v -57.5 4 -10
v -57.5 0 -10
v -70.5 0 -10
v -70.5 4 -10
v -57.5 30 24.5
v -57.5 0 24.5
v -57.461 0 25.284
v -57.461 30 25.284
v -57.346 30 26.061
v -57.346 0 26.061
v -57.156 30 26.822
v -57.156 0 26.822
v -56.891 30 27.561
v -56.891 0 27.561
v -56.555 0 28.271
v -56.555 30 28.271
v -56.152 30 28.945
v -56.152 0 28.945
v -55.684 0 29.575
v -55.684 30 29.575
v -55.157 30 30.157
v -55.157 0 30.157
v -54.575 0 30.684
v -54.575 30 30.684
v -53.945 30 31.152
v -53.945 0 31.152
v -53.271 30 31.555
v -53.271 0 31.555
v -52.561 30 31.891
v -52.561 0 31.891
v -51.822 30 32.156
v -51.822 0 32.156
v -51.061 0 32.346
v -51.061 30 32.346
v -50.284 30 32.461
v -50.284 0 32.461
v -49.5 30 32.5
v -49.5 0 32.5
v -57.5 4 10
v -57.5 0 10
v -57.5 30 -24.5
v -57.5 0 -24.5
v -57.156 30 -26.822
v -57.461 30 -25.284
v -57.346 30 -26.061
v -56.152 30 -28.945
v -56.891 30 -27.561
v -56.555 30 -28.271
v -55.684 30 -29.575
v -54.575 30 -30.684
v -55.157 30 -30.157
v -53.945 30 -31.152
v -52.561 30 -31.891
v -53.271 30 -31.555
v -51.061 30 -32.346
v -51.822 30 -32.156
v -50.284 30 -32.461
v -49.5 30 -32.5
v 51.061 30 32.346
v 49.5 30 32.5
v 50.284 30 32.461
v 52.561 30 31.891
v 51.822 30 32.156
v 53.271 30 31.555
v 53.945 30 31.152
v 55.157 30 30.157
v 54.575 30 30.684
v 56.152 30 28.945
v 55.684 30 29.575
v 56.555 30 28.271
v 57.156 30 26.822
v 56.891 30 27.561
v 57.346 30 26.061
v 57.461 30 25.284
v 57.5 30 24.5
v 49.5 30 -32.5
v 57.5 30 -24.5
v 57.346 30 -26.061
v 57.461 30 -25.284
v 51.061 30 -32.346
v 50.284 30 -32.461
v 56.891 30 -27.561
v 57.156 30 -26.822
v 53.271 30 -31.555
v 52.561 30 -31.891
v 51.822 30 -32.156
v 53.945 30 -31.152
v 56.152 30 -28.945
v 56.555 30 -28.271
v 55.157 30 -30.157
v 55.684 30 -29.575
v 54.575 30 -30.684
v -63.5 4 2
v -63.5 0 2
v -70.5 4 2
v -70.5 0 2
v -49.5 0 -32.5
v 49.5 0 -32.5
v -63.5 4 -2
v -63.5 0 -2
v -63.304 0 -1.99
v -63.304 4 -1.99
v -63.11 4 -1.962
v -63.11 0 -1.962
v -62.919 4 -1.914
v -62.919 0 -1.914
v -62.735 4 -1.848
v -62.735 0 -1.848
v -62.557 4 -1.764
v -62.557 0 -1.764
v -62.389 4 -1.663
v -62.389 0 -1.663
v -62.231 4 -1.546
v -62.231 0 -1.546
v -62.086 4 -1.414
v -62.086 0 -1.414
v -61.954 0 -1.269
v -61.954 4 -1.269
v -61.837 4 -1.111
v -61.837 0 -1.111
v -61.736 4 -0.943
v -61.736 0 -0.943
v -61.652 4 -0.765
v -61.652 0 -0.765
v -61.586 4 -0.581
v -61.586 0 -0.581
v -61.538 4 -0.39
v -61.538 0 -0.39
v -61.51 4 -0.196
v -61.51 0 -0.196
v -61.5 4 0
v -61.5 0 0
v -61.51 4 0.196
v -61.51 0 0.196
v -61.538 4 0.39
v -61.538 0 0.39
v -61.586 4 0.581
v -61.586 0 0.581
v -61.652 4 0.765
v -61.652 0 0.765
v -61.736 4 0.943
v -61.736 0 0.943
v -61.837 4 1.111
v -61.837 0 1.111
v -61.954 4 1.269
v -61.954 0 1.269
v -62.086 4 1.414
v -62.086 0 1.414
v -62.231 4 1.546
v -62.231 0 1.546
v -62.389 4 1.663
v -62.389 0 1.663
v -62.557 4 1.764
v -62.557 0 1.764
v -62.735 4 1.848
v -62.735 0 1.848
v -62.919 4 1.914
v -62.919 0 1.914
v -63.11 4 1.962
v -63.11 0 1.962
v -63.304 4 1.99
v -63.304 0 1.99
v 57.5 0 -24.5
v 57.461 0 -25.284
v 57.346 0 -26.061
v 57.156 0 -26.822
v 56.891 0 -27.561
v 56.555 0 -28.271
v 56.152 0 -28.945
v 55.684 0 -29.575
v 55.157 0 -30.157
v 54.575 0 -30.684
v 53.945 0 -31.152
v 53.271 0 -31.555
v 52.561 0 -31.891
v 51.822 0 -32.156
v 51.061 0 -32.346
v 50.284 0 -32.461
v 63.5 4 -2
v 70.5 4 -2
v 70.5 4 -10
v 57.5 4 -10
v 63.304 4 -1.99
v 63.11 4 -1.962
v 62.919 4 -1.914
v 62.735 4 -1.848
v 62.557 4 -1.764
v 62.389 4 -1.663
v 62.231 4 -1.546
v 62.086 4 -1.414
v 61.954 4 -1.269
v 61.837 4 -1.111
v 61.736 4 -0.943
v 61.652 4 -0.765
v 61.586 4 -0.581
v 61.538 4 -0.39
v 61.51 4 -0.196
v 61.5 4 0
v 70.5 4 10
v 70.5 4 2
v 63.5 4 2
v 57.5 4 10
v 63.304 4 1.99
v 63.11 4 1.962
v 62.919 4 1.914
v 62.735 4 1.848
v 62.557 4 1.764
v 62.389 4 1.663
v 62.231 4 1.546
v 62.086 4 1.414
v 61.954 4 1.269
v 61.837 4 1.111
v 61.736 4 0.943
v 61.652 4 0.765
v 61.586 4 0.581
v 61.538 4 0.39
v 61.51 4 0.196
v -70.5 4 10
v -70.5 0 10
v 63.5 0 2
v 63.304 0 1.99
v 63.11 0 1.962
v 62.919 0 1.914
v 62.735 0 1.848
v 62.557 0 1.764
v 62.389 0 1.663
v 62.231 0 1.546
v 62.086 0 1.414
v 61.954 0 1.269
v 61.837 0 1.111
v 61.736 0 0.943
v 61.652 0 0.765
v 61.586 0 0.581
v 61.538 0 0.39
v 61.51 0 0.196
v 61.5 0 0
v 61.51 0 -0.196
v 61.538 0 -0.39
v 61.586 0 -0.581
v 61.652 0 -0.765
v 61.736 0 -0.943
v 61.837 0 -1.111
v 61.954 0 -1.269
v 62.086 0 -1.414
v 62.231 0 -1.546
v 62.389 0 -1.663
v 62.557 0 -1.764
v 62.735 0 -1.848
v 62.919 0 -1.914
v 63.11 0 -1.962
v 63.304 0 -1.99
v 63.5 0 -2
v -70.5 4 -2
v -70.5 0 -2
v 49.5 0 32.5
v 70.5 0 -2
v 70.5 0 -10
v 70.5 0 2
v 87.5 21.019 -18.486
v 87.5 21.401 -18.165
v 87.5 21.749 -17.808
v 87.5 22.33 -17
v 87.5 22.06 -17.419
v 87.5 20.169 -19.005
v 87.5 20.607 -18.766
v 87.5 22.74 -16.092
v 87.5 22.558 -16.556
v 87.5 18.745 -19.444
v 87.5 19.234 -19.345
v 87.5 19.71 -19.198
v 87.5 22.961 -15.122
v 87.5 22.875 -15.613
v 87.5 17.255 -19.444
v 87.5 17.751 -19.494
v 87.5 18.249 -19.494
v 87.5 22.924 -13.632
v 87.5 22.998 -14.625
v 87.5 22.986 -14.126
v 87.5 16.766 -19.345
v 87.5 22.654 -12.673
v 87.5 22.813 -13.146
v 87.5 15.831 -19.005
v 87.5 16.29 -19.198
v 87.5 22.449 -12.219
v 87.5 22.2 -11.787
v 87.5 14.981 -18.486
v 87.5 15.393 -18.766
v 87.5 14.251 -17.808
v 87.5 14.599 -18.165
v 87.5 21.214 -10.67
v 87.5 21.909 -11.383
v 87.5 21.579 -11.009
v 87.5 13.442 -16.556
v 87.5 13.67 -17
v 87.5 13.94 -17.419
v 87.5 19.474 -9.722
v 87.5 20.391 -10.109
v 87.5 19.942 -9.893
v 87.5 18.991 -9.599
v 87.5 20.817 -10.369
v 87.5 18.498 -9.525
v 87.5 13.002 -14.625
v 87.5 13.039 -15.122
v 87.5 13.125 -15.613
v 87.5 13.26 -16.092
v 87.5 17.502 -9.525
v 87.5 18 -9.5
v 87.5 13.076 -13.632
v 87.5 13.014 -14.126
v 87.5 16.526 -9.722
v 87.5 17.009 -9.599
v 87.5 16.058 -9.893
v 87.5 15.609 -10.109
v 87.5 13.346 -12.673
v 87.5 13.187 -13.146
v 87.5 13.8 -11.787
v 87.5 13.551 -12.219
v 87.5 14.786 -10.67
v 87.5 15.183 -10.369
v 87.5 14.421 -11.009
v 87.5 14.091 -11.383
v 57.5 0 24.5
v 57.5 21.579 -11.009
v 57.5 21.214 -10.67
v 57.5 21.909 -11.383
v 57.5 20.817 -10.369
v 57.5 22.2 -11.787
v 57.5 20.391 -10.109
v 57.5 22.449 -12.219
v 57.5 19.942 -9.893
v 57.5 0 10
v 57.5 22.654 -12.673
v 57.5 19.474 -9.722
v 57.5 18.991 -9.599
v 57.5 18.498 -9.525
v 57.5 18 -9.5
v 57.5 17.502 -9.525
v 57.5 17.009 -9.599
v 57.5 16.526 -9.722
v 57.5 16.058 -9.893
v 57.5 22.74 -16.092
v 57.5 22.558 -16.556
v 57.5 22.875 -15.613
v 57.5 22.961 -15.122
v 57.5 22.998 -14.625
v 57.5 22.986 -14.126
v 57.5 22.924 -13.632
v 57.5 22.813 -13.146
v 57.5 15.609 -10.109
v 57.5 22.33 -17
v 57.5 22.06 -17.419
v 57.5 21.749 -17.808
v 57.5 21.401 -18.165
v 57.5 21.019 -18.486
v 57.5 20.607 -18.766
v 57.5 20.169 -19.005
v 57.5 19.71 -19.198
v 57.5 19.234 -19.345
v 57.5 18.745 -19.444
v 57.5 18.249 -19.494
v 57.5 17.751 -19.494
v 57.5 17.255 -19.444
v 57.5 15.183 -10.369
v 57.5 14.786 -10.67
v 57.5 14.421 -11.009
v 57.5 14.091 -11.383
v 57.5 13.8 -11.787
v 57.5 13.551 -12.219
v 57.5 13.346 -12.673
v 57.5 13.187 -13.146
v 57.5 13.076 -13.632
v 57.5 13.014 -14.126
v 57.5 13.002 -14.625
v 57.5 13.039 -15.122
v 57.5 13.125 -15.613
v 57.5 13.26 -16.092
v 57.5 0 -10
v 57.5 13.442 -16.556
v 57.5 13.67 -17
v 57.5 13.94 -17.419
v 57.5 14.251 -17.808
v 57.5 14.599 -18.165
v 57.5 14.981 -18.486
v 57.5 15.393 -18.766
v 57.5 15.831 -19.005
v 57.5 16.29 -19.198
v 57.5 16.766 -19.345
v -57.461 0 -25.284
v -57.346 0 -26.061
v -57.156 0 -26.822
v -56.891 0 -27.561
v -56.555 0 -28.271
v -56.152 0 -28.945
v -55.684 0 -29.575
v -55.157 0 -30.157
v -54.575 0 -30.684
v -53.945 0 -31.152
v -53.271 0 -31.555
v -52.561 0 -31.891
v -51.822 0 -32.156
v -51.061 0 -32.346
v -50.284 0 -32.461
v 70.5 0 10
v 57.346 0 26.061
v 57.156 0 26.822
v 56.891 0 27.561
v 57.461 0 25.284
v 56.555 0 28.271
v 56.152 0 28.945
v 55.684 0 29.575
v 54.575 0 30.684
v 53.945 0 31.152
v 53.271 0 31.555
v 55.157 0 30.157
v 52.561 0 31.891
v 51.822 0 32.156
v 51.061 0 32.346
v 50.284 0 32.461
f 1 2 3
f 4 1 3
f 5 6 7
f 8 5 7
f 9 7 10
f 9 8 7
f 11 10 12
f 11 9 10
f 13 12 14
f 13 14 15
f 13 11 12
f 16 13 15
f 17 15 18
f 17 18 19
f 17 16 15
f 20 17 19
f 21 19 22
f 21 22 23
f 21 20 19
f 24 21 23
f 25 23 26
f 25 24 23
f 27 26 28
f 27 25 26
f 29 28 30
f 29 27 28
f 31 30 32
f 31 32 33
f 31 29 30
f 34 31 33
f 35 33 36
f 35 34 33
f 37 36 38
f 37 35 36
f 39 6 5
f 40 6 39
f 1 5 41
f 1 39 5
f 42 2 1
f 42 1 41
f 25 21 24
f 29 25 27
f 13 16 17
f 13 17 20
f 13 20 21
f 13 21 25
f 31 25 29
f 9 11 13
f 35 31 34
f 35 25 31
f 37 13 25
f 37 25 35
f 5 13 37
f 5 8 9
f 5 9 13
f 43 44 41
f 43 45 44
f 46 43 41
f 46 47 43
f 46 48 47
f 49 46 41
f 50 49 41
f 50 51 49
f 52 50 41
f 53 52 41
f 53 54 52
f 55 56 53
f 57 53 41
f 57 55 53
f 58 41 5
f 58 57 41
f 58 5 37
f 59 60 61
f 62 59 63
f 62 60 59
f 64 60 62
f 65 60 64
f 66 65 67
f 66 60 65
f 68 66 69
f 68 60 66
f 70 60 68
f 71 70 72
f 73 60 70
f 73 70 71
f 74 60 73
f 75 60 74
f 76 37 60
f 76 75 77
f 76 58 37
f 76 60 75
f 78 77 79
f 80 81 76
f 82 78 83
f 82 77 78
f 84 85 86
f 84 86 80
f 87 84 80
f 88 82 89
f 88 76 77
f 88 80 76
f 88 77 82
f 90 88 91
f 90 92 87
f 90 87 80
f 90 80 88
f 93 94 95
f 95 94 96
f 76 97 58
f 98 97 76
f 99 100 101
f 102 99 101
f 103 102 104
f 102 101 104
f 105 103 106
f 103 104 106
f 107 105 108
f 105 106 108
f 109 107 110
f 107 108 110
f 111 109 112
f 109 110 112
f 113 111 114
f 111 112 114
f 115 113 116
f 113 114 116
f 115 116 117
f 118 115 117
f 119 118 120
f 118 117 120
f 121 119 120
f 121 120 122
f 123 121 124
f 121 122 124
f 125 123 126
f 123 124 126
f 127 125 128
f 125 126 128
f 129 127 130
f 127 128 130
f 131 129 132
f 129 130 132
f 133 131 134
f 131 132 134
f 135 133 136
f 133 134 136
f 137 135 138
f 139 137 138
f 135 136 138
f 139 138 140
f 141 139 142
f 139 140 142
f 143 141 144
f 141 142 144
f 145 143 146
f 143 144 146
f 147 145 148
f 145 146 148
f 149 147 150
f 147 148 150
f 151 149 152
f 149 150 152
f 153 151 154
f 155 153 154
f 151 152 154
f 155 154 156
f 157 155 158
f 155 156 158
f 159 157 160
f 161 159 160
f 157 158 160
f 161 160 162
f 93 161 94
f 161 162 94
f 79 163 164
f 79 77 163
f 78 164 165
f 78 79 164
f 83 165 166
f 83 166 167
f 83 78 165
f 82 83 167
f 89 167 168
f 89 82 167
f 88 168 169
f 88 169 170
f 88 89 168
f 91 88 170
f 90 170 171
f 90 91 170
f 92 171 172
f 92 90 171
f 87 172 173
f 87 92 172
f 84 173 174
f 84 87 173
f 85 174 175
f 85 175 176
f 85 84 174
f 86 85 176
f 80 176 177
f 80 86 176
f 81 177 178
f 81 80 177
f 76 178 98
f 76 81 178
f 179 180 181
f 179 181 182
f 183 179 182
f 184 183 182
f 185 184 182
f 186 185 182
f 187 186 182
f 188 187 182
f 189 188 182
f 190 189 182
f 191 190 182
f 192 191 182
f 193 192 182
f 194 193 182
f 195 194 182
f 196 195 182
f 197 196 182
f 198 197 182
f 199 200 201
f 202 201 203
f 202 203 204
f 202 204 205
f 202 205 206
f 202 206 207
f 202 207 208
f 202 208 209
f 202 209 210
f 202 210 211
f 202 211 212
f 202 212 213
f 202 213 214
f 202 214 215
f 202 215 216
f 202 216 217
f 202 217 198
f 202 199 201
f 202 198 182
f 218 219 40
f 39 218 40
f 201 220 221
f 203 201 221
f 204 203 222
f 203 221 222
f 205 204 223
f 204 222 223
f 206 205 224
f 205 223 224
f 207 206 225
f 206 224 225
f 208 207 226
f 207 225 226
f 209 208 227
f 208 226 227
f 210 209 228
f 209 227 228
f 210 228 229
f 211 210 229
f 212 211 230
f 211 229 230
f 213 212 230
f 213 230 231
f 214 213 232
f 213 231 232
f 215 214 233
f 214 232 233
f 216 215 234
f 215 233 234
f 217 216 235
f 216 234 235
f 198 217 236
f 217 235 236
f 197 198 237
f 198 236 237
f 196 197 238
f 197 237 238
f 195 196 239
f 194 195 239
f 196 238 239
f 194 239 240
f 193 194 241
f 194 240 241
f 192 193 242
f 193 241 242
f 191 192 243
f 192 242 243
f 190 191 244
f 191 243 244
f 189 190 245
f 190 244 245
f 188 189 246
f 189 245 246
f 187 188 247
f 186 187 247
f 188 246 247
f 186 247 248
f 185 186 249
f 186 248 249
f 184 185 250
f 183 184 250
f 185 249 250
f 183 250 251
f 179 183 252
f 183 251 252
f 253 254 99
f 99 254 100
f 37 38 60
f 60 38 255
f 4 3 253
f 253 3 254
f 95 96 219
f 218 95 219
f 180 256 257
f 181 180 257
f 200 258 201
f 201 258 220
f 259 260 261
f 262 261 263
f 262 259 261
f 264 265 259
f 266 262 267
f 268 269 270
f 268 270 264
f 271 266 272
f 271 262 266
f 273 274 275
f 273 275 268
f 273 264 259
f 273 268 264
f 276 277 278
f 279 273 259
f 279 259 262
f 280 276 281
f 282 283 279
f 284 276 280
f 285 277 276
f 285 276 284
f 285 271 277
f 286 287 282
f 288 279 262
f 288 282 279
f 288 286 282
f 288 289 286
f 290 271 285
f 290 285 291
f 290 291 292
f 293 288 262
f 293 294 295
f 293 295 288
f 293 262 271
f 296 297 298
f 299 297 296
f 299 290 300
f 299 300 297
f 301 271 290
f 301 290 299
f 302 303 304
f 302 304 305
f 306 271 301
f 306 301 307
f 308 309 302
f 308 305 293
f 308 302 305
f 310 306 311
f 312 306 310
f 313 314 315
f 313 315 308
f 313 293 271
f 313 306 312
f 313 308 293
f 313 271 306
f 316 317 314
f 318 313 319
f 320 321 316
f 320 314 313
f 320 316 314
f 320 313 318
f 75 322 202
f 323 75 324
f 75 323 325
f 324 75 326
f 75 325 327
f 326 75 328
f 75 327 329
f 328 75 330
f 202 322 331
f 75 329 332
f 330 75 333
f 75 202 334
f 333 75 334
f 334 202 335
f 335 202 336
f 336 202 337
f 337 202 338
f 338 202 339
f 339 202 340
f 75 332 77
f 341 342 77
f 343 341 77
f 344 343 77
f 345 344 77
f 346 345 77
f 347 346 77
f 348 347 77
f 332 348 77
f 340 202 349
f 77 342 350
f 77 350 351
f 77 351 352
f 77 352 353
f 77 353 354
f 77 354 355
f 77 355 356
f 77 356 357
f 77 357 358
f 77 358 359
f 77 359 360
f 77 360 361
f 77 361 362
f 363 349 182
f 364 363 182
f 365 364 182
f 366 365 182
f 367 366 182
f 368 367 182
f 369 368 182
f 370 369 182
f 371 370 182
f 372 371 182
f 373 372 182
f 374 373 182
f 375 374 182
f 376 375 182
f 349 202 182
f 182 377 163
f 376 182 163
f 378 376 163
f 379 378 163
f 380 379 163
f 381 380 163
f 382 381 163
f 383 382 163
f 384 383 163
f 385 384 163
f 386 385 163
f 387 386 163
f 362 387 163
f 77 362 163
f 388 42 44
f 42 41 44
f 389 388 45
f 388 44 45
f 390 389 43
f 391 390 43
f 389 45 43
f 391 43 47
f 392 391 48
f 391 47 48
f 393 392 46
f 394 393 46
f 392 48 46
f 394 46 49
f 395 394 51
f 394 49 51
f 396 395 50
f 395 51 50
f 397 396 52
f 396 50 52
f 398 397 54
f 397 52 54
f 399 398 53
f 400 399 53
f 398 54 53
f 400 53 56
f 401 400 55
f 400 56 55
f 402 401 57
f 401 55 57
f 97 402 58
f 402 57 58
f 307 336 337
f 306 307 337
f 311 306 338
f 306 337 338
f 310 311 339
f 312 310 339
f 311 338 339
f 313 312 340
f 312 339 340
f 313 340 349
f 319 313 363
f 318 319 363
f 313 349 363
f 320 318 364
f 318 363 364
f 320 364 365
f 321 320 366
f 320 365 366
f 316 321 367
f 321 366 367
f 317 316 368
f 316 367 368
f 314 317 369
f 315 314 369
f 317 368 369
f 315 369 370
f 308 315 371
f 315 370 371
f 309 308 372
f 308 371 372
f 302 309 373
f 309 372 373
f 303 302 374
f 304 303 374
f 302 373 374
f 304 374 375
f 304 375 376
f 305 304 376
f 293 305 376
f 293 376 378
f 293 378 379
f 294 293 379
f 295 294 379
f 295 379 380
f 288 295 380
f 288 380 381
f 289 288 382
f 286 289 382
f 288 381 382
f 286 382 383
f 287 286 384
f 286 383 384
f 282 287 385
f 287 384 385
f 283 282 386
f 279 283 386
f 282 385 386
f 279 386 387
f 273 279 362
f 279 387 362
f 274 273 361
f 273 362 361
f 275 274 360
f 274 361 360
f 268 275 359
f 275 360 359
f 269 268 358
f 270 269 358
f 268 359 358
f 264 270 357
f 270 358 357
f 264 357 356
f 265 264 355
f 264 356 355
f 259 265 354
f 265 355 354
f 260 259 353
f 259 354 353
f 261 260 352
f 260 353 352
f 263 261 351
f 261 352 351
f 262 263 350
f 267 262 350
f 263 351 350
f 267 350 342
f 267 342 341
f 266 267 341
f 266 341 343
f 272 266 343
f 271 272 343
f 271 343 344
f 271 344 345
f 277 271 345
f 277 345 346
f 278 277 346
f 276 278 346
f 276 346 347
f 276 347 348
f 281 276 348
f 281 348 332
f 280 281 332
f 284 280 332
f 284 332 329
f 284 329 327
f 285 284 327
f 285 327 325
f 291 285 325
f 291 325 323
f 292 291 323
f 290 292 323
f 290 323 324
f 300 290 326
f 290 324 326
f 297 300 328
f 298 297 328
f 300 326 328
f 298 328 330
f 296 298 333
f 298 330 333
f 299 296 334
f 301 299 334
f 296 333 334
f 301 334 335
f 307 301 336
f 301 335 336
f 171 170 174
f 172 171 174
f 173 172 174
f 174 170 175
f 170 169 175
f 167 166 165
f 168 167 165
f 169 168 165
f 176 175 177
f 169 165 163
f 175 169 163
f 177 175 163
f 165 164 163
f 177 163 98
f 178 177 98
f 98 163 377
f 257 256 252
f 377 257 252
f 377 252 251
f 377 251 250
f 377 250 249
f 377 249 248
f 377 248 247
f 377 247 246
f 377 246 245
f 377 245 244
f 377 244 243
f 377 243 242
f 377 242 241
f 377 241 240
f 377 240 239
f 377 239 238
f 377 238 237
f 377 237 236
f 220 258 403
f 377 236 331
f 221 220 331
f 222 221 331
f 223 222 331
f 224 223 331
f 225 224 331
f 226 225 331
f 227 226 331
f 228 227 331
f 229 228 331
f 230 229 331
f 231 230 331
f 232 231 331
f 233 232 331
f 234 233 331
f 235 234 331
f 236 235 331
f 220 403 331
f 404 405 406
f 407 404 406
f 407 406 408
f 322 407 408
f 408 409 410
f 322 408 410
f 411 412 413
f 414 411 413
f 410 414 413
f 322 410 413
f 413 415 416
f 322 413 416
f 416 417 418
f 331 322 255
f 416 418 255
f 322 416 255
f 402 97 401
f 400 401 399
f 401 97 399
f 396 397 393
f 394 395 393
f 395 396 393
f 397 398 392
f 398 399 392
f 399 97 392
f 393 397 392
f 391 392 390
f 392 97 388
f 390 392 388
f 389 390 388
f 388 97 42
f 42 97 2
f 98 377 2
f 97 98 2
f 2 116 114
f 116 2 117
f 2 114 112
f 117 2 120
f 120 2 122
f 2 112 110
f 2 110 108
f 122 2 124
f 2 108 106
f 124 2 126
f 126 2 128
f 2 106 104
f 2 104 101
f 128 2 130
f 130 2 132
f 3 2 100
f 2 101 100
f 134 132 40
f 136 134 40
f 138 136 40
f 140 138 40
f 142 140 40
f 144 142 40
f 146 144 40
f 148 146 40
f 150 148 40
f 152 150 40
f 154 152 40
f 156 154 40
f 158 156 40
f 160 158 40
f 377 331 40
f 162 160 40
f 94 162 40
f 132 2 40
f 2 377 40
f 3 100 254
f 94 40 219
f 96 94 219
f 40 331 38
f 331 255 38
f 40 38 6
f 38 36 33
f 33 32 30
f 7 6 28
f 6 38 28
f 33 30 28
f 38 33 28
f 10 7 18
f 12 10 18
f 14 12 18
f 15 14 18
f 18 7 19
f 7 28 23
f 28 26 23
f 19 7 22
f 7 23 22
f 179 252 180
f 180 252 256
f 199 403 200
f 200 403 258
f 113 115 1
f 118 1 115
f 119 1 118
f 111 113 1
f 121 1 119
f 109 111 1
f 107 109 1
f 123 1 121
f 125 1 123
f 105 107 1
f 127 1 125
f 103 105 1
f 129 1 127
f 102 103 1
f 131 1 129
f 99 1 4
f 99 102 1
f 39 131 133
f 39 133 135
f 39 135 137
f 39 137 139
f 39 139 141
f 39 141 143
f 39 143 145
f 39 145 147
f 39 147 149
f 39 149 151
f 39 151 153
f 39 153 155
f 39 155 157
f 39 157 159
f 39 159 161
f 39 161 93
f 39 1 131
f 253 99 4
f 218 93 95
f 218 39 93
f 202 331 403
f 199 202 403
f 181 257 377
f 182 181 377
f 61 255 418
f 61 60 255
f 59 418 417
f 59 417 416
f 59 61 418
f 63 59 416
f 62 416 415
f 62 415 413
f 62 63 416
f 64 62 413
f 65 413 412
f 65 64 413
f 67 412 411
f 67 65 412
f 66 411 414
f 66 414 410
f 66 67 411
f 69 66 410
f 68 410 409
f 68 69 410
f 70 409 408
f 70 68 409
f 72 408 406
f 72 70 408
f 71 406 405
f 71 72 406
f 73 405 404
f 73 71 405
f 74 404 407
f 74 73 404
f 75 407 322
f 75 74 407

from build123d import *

# Parameters (mm, degrees)
SKETCH1_W           = 115
SKETCH1_H           = 65
BOSS_EXTRUDE1_DEPTH = 30
BOSS_EXTRUDE2_DEPTH = 4
SKETCH4_R           = 5
BOSS_EXTRUDE3_DEPTH = 30
FILLET1_R           = 8


with BuildPart() as part:
    # Sketch1 → Boss-Extrude1 (new body)
    with BuildSketch(Plane(origin=(0, 0, 0), x_dir=(1, 0, 0), z_dir=(0, 1, 0))):
        Rectangle(SKETCH1_W, SKETCH1_H)
    extrude(amount=BOSS_EXTRUDE1_DEPTH)

    # Sketch3 → Boss-Extrude2 (add)
    with BuildSketch(Plane.XZ):
        with BuildLine():
            Line((-70.5, 10), (70.5, 10))
            Line((70.5, 10), (70.5, 2))
            Line((70.5, 2), (63.5, 2))
            ThreePointArc((63.5, 2), (61.5, 0), (63.5, -2))
            Line((63.5, -2), (70.5, -2))
            Line((70.5, -2), (70.5, -10))
            Line((70.5, -10), (-70.5, -10))
            Line((-70.5, -10), (-70.5, -2))
            Line((-70.5, -2), (-63.5, -2))
            ThreePointArc((-63.5, -2), (-61.5, 0), (-63.5, 2))
            Line((-63.5, 2), (-70.5, 2))
            Line((-70.5, 2), (-70.5, 10))
        make_face()
    extrude(amount=-BOSS_EXTRUDE2_DEPTH)

    # Sketch4 → Boss-Extrude3 (add)
    with BuildSketch(Plane(origin=(57.5, 0, 0), x_dir=(0, 0, -1), z_dir=(1, 0, 0))):
        with Locations(Location((14.5, 18, 0), (0, 0, 180))):
            Circle(SKETCH4_R)
    extrude(amount=BOSS_EXTRUDE3_DEPTH)

    # Fillet1
    fillet1_edges = [part.edges().sort_by_distance(p)[0] for p in [
        (-57.5, 15, -32.5),
        (57.5, 15, -32.5),
        (57.5, 15, 32.5),
        (-57.5, 15, 32.5),
    ]]
    fillet(fillet1_edges, radius=FILLET1_R)


solid = part.part
